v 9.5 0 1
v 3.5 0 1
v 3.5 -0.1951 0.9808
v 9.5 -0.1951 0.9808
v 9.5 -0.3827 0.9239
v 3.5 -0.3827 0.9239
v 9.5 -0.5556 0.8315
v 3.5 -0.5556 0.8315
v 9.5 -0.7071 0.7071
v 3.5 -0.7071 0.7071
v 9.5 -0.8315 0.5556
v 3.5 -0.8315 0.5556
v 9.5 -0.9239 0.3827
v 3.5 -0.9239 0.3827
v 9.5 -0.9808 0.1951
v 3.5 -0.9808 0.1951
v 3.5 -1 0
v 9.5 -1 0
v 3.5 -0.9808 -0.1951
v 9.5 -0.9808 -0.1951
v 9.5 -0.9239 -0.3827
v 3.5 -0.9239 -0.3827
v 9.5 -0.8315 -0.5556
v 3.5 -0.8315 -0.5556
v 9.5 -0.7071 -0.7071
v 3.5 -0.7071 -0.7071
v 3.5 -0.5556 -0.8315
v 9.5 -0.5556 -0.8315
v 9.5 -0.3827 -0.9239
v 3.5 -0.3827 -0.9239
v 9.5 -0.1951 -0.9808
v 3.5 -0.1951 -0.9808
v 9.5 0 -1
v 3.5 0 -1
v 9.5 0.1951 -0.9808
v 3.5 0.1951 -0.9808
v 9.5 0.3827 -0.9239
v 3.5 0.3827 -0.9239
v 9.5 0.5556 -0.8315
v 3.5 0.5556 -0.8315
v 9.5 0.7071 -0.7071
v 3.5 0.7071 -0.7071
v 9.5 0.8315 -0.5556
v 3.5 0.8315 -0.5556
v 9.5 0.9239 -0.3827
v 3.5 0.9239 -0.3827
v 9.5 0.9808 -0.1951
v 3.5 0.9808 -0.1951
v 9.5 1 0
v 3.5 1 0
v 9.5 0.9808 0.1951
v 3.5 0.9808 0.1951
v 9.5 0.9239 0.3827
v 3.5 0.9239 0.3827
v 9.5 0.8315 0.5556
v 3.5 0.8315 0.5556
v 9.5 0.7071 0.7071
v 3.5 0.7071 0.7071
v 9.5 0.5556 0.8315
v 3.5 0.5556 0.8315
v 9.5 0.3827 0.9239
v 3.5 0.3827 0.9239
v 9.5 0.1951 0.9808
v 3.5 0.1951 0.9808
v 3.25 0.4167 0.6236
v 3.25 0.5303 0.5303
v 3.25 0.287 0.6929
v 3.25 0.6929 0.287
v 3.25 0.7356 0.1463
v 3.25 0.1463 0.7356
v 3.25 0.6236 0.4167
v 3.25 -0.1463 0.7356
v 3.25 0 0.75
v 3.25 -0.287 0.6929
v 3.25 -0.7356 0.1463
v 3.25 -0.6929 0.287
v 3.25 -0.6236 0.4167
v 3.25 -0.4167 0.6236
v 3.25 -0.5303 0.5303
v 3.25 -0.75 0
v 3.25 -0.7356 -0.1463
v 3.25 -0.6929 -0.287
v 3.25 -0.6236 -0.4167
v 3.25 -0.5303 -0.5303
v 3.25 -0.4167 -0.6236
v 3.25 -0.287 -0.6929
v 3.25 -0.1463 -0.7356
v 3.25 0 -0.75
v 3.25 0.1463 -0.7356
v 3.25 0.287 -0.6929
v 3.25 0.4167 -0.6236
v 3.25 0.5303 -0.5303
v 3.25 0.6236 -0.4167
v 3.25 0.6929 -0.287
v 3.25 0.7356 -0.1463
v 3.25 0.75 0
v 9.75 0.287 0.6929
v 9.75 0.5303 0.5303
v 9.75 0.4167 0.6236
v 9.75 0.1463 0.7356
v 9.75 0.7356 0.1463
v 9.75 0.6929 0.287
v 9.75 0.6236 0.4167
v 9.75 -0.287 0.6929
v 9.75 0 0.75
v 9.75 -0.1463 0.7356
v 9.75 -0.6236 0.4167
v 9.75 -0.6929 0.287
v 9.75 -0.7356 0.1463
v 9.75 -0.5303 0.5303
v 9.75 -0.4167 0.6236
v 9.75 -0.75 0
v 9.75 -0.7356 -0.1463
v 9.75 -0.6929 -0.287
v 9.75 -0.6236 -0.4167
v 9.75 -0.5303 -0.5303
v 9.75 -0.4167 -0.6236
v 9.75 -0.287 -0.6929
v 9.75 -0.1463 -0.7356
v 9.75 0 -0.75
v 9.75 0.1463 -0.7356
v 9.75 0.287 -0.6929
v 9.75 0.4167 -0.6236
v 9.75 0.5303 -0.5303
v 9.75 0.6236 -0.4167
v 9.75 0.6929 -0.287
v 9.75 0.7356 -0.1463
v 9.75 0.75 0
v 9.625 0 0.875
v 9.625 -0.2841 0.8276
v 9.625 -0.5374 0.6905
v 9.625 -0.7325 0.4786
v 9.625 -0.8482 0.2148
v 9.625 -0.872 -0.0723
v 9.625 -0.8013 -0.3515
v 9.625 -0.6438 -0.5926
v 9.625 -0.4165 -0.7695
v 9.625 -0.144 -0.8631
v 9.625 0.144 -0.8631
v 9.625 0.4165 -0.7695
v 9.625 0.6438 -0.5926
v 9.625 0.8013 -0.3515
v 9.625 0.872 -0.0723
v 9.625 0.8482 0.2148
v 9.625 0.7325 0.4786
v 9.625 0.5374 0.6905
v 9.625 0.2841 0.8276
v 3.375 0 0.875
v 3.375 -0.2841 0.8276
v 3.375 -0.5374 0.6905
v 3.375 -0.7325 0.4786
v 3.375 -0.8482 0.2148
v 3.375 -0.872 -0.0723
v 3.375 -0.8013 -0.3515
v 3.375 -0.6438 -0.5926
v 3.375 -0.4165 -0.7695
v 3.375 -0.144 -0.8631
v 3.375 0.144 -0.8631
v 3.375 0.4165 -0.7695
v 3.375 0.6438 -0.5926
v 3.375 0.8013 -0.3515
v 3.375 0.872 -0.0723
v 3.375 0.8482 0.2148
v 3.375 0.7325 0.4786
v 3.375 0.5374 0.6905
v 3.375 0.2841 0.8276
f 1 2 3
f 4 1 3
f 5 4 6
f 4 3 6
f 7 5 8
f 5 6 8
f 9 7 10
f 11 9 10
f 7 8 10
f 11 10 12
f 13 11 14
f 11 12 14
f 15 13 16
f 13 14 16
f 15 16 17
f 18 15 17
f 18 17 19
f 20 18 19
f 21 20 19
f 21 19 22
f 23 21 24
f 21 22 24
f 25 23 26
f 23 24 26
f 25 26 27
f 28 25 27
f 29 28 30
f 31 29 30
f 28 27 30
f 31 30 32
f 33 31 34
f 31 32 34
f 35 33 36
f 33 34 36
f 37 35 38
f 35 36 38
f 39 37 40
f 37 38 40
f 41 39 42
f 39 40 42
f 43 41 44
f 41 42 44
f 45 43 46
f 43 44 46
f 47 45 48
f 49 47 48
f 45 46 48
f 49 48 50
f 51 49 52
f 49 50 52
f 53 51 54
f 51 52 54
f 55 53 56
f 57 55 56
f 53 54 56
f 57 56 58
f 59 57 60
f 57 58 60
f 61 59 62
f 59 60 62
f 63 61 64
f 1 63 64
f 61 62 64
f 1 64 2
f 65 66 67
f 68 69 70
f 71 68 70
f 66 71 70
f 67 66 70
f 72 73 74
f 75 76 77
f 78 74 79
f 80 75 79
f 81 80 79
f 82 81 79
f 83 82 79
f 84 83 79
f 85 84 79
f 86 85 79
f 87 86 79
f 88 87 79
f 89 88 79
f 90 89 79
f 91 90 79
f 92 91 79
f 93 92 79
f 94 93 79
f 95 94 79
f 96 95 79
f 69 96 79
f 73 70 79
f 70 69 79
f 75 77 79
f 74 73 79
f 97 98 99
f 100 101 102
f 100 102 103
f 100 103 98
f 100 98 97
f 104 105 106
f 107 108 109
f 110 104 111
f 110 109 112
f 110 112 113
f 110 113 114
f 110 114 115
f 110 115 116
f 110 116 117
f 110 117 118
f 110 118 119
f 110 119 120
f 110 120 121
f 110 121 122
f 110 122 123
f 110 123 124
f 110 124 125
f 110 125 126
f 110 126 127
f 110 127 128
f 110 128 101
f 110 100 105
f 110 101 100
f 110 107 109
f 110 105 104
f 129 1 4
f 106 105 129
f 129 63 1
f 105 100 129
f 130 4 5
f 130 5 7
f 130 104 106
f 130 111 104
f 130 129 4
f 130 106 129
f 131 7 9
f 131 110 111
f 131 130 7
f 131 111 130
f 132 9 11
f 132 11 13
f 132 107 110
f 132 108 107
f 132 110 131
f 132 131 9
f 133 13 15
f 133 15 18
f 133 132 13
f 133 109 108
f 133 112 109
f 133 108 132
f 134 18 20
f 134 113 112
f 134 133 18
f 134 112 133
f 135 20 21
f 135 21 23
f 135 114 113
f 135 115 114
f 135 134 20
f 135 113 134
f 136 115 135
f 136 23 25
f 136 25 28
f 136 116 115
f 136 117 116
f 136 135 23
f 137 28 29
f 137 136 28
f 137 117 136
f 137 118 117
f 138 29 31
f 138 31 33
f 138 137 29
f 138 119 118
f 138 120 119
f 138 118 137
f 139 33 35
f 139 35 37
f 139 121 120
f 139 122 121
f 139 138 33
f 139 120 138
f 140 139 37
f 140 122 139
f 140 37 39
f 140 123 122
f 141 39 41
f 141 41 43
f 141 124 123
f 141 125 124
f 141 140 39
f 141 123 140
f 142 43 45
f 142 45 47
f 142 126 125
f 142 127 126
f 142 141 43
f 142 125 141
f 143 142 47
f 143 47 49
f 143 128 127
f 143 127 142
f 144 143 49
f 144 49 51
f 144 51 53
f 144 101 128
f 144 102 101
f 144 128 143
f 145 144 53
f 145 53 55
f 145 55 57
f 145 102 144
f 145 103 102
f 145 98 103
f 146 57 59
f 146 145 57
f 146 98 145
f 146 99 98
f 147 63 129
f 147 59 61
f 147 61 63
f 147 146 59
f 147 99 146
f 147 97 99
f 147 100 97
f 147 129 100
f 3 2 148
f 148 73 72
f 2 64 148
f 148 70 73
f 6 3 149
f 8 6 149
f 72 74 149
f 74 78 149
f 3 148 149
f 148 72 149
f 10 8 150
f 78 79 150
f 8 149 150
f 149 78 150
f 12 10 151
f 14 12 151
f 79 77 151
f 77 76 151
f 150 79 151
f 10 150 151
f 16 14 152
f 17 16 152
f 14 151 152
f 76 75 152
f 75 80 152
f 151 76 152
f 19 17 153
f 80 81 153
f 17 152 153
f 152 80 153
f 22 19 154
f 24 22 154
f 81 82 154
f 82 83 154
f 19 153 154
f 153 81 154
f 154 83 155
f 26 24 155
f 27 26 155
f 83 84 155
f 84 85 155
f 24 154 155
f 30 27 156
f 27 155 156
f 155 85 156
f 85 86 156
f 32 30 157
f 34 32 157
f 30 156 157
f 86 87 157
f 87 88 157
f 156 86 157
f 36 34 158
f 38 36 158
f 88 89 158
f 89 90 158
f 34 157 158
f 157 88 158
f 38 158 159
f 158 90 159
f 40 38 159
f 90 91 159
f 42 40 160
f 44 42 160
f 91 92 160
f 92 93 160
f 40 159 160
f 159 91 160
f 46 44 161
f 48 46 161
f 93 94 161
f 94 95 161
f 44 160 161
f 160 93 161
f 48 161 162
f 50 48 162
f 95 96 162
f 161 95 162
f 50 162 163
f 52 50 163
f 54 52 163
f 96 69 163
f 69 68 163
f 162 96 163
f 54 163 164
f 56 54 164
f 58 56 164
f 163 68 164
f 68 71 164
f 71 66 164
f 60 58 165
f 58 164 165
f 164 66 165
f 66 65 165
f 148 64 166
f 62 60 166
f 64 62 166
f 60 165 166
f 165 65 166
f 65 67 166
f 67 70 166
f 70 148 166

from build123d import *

# Parameters (mm, degrees)
SKETCH2_R           = 2
BOSS_EXTRUDE1_DEPTH = 13
CHAMFER1_SIZE       = 0.5
ECHELLE1_SCALE      = 2
ECHELLE2_SCALE      = 0.25


with BuildPart() as part:
    # Sketch2 → Boss-Extrude1 (new body)
    with BuildSketch(Plane(origin=(0, 0, 0), x_dir=(0, 0, -1), z_dir=(1, 0, 0))):
        with Locations(Location((0, 0, 0), (0, 0, 180))):
            Circle(SKETCH2_R)
    extrude(amount=BOSS_EXTRUDE1_DEPTH)

    # Chamfer1
    chamfer1_edges = [part.edges().sort_by_distance(p)[0] for p in [
        (0, 0, -2),
        (13, 0, -2),
    ]]
    chamfer(chamfer1_edges, length=CHAMFER1_SIZE)


with BuildPart() as part_1:
    # Echelle1: scaled about (6.5, 0, 0)
    add(part.part.scale(ECHELLE1_SCALE).moved(Location((-6.5, 0, 0))))


with BuildPart() as part_2:
    # Echelle2: scaled about (6.5, 0, 0)
    add(part_1.part.scale(ECHELLE2_SCALE).moved(Location((4.875, 0, 0))))


solid = part_2.part
